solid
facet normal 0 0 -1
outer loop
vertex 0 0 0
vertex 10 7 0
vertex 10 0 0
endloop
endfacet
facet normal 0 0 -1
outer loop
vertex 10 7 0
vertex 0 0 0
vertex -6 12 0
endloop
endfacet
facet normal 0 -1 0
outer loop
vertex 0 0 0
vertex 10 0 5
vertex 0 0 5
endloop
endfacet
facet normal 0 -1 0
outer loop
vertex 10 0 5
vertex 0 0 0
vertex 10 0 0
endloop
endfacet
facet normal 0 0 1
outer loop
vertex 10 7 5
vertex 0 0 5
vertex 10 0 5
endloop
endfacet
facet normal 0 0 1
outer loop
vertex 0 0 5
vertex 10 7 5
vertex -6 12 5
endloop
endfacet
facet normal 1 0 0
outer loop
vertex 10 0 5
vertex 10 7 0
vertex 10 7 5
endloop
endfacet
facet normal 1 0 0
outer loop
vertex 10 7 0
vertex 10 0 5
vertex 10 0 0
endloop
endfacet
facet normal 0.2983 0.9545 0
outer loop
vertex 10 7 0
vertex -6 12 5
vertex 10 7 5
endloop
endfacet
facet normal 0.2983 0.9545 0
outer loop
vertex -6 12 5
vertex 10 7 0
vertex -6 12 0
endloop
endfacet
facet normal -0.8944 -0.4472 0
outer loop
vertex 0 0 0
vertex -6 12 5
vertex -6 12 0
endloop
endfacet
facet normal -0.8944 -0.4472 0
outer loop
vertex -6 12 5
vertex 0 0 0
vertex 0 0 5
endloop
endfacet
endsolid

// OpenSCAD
CubePoints = [
  [  0,  0,  0 ],  
  [ 10,  0,  0 ],  
  [ 10,  7,  0 ],  
  [ -6, 12,  0 ],
  [  0,  0,  5 ],  
  [ 10,  0,  5 ],  
  [ 10,  7,  5 ], 
  [ -6, 12,  5 ]];
  
CubeFaces = [
  [0,1,2,3],  
  [4,5,1,0],  
  [7,6,5,4],  
  [5,6,2,1],  
  [6,7,3,2],  
  [7,4,0,3]]; 
  
polyhedron( CubePoints, CubeFaces );
